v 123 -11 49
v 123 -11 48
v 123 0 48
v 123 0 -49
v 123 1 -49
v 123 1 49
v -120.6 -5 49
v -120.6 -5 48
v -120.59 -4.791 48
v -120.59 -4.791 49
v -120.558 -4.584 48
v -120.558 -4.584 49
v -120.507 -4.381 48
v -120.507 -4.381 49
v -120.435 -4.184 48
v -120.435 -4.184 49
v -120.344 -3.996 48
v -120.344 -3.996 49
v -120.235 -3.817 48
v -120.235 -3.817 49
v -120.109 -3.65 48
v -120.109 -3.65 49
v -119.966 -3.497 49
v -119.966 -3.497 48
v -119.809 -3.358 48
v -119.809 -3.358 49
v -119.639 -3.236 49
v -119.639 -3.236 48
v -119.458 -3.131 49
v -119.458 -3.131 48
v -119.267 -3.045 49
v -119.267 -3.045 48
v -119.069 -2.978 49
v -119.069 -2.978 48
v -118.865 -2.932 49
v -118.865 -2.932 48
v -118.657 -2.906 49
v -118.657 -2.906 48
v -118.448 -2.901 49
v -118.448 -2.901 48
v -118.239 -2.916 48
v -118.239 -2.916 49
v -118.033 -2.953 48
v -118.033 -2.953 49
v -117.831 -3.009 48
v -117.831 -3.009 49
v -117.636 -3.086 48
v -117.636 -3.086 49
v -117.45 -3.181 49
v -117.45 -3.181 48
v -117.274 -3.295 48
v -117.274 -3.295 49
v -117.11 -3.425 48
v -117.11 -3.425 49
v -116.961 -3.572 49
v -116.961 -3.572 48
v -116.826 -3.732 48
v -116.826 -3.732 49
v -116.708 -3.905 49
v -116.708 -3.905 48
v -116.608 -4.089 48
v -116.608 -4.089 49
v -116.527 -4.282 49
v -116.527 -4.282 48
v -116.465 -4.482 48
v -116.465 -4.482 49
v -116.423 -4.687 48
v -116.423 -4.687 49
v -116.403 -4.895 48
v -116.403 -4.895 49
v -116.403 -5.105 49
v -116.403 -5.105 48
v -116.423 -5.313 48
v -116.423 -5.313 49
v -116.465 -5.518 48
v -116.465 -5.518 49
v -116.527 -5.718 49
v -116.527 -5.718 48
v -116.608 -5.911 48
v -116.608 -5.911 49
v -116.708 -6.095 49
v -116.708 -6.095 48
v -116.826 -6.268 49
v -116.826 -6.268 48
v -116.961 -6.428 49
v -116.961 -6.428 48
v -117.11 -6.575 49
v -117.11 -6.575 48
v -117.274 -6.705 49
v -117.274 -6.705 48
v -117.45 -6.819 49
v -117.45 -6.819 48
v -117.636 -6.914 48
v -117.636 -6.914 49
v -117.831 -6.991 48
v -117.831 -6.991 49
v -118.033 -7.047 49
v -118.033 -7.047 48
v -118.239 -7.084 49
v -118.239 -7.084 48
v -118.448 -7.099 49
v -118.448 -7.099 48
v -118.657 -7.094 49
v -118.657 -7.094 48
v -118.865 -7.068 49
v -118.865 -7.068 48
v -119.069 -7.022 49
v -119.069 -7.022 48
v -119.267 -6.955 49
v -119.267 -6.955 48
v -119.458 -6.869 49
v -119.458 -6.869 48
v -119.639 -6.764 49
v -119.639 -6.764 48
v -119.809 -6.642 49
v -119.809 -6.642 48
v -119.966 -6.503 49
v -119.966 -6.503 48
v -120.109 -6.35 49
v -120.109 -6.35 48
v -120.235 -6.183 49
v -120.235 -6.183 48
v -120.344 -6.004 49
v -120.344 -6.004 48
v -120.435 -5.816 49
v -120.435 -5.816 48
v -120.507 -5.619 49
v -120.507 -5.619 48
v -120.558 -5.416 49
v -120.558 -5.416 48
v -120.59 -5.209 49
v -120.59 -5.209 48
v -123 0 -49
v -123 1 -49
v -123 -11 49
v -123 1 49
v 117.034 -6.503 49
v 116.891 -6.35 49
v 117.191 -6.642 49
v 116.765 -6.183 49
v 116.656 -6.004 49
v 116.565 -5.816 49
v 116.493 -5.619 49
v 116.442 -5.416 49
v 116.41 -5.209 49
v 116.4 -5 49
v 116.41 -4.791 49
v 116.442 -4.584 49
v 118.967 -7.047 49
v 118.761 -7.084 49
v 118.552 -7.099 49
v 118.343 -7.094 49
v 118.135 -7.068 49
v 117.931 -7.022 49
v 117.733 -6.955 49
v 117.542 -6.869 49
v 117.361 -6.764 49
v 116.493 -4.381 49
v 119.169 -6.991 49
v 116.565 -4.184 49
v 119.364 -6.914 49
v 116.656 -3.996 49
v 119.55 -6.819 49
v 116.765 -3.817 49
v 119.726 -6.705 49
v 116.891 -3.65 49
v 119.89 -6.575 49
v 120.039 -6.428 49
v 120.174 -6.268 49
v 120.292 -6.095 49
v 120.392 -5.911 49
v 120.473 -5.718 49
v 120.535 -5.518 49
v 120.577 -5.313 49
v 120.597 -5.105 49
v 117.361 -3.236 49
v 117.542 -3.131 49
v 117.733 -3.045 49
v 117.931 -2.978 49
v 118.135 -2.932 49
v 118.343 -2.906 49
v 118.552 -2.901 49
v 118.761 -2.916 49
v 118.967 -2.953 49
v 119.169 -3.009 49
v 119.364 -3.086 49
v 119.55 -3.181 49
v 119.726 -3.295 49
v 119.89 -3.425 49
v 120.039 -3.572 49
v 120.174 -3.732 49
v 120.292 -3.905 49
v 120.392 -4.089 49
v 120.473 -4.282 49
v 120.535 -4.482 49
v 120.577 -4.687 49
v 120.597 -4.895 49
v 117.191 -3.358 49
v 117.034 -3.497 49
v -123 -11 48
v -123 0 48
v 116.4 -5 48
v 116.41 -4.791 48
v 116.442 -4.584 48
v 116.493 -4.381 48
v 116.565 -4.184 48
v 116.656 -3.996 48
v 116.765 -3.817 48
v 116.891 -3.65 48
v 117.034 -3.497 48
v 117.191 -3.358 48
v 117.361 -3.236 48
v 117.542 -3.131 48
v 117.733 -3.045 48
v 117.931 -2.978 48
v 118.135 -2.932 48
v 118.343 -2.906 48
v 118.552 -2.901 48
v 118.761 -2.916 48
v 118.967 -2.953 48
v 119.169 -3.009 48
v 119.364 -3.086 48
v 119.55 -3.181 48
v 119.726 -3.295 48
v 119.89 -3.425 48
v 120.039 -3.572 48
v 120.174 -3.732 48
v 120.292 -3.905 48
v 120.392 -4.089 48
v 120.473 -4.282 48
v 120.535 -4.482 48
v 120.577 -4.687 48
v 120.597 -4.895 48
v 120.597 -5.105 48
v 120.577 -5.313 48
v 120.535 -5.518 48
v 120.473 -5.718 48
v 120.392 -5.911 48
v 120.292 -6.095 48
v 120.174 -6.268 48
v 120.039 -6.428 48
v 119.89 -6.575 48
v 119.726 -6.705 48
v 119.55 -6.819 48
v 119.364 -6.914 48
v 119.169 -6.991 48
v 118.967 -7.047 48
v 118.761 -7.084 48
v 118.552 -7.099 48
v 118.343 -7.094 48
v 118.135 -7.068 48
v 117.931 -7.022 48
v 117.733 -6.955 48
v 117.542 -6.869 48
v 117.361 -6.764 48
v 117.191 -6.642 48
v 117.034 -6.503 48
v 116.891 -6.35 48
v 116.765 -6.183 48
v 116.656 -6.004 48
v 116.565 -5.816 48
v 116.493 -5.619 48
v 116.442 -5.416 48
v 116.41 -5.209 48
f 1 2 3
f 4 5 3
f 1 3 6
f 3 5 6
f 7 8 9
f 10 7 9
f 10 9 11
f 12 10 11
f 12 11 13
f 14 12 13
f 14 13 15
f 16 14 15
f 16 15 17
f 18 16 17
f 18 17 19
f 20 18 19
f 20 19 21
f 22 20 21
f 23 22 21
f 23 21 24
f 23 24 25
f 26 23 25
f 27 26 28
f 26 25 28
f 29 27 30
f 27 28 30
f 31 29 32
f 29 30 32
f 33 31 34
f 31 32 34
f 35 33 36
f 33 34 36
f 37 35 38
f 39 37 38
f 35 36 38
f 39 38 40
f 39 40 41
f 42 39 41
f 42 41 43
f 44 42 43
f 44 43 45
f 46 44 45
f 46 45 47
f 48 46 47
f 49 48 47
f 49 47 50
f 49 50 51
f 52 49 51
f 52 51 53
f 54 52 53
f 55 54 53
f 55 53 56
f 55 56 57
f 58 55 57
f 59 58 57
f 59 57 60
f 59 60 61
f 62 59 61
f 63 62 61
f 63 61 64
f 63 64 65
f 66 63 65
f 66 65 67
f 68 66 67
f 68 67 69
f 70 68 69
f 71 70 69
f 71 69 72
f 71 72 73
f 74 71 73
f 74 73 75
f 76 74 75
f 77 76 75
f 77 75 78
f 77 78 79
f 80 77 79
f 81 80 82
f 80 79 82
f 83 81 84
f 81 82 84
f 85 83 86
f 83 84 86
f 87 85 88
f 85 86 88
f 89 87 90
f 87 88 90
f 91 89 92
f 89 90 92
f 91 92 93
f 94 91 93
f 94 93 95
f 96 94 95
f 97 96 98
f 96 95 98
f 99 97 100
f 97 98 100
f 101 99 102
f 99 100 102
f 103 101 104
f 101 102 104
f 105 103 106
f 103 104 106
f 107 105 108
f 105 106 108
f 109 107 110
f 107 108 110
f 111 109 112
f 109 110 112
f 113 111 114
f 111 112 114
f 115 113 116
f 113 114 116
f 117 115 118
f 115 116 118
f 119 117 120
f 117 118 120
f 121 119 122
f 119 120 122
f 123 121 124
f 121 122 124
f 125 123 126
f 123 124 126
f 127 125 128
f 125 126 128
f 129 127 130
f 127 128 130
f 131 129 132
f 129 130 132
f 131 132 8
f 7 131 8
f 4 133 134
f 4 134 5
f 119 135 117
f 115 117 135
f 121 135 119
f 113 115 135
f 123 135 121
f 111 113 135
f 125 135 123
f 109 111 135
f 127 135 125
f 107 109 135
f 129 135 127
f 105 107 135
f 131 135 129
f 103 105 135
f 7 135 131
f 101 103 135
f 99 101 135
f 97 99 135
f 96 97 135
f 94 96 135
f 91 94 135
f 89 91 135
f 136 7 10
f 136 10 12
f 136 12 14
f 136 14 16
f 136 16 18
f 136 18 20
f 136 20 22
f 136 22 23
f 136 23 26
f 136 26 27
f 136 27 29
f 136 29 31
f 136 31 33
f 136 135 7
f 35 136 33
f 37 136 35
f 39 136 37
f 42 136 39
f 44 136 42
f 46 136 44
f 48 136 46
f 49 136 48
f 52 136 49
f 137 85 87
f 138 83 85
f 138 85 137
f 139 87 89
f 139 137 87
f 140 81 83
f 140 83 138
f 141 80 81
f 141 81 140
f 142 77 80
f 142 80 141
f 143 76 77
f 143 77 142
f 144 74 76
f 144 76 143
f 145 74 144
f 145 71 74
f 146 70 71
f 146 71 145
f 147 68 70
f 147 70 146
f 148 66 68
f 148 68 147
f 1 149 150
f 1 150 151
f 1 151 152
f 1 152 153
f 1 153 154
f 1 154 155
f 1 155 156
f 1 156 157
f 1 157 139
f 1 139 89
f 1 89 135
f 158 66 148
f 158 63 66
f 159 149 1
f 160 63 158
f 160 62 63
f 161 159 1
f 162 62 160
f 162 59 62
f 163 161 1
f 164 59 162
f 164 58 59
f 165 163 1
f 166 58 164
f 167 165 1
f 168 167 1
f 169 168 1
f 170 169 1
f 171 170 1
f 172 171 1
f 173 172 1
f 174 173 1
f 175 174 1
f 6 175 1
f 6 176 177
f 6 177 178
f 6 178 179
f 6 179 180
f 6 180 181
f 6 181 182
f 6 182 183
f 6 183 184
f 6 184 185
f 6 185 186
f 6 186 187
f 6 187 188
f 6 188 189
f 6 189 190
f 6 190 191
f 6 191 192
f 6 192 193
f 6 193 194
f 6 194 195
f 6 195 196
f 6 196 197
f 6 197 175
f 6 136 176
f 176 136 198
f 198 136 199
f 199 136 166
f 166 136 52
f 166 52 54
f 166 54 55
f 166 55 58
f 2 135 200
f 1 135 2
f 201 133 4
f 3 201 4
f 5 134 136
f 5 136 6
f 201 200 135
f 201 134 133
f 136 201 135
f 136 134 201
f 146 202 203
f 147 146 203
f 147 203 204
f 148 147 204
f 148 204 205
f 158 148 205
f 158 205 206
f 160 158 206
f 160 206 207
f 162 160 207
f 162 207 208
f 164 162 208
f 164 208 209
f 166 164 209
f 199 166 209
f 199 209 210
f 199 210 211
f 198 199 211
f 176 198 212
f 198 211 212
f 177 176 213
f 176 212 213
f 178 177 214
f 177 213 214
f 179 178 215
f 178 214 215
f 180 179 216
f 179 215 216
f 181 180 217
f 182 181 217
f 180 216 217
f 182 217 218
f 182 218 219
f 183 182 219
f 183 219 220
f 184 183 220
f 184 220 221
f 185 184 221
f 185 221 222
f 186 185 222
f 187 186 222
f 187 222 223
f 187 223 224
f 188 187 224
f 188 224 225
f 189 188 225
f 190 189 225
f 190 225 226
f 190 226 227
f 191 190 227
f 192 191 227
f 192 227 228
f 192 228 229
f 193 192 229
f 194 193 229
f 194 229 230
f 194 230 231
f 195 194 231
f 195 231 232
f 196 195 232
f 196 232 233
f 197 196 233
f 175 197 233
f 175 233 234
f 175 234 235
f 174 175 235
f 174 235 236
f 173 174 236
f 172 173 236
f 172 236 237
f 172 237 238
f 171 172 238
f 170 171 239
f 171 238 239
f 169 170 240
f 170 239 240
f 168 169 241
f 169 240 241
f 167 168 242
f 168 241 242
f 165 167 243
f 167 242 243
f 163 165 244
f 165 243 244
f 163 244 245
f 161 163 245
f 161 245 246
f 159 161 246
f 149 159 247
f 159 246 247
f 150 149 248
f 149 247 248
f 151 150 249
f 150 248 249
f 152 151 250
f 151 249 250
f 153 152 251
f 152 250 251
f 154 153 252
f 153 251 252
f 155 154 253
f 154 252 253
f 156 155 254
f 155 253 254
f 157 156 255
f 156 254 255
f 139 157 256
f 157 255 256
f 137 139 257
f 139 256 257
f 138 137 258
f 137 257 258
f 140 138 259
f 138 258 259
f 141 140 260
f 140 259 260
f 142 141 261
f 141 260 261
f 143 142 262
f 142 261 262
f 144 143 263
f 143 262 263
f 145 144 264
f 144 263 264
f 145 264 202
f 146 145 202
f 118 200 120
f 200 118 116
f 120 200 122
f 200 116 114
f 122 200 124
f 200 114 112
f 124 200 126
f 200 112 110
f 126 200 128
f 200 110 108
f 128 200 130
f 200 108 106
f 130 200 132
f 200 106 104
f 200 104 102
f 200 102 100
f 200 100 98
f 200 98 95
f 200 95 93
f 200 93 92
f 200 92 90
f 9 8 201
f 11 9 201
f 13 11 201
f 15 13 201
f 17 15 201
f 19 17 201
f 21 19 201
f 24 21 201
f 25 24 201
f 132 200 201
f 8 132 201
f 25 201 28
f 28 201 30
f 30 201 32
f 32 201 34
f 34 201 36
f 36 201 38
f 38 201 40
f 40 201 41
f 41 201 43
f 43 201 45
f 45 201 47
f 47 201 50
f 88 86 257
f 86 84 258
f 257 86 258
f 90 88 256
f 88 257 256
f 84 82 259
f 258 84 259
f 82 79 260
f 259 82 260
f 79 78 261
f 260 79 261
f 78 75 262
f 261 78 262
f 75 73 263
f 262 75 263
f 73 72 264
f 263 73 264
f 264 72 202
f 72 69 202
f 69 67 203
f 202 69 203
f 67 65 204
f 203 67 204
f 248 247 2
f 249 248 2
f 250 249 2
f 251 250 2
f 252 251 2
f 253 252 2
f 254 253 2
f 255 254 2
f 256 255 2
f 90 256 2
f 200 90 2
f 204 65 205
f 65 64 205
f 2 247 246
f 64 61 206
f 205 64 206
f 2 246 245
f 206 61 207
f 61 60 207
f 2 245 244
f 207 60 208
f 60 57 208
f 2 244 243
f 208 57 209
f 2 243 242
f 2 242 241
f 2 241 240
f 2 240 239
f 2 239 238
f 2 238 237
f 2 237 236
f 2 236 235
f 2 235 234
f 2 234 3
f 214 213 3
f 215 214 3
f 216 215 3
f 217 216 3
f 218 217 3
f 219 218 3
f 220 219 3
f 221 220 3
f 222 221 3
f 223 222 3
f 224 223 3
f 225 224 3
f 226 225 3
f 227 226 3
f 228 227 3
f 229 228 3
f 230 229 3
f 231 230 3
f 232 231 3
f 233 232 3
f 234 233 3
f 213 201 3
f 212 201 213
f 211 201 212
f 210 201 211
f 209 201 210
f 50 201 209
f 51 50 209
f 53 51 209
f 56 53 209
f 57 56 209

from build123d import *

# Parameters (mm, degrees)
SKETCH_1_W        = 246
SKETCH_1_H        = 98
EXTRUDE_1_DEPTH   = 1
SKETCH_2_W        = 246
SKETCH_2_H        = 1
EXTRUDE_2_DEPTH   = 11
HOLE_WIZARD_M41_D = 4.2


with BuildPart() as part:
    # Эскиз1 → Бобышка-Вытянуть1 (new body)
    with BuildSketch(Plane(origin=(0, 0, 0), x_dir=(1, 0, 0), z_dir=(0, 1, 0))):
        Rectangle(SKETCH_1_W, SKETCH_1_H)
    extrude(amount=EXTRUDE_1_DEPTH)

    # Эскиз2 → Бобышка-Вытянуть2 (add)
    with BuildSketch(Plane.XZ):
        with Locations((0, 48.5)):
            Rectangle(SKETCH_2_W, SKETCH_2_H)
    extrude(amount=EXTRUDE_2_DEPTH)

    # Сверло под метчик  спиральное M41 (through all)
    with Locations(Plane.XY.offset(49)):
        with Locations((118.5, -5), (-118.5, -5)):
            Hole(HOLE_WIZARD_M41_D / 2)


solid = part.part
